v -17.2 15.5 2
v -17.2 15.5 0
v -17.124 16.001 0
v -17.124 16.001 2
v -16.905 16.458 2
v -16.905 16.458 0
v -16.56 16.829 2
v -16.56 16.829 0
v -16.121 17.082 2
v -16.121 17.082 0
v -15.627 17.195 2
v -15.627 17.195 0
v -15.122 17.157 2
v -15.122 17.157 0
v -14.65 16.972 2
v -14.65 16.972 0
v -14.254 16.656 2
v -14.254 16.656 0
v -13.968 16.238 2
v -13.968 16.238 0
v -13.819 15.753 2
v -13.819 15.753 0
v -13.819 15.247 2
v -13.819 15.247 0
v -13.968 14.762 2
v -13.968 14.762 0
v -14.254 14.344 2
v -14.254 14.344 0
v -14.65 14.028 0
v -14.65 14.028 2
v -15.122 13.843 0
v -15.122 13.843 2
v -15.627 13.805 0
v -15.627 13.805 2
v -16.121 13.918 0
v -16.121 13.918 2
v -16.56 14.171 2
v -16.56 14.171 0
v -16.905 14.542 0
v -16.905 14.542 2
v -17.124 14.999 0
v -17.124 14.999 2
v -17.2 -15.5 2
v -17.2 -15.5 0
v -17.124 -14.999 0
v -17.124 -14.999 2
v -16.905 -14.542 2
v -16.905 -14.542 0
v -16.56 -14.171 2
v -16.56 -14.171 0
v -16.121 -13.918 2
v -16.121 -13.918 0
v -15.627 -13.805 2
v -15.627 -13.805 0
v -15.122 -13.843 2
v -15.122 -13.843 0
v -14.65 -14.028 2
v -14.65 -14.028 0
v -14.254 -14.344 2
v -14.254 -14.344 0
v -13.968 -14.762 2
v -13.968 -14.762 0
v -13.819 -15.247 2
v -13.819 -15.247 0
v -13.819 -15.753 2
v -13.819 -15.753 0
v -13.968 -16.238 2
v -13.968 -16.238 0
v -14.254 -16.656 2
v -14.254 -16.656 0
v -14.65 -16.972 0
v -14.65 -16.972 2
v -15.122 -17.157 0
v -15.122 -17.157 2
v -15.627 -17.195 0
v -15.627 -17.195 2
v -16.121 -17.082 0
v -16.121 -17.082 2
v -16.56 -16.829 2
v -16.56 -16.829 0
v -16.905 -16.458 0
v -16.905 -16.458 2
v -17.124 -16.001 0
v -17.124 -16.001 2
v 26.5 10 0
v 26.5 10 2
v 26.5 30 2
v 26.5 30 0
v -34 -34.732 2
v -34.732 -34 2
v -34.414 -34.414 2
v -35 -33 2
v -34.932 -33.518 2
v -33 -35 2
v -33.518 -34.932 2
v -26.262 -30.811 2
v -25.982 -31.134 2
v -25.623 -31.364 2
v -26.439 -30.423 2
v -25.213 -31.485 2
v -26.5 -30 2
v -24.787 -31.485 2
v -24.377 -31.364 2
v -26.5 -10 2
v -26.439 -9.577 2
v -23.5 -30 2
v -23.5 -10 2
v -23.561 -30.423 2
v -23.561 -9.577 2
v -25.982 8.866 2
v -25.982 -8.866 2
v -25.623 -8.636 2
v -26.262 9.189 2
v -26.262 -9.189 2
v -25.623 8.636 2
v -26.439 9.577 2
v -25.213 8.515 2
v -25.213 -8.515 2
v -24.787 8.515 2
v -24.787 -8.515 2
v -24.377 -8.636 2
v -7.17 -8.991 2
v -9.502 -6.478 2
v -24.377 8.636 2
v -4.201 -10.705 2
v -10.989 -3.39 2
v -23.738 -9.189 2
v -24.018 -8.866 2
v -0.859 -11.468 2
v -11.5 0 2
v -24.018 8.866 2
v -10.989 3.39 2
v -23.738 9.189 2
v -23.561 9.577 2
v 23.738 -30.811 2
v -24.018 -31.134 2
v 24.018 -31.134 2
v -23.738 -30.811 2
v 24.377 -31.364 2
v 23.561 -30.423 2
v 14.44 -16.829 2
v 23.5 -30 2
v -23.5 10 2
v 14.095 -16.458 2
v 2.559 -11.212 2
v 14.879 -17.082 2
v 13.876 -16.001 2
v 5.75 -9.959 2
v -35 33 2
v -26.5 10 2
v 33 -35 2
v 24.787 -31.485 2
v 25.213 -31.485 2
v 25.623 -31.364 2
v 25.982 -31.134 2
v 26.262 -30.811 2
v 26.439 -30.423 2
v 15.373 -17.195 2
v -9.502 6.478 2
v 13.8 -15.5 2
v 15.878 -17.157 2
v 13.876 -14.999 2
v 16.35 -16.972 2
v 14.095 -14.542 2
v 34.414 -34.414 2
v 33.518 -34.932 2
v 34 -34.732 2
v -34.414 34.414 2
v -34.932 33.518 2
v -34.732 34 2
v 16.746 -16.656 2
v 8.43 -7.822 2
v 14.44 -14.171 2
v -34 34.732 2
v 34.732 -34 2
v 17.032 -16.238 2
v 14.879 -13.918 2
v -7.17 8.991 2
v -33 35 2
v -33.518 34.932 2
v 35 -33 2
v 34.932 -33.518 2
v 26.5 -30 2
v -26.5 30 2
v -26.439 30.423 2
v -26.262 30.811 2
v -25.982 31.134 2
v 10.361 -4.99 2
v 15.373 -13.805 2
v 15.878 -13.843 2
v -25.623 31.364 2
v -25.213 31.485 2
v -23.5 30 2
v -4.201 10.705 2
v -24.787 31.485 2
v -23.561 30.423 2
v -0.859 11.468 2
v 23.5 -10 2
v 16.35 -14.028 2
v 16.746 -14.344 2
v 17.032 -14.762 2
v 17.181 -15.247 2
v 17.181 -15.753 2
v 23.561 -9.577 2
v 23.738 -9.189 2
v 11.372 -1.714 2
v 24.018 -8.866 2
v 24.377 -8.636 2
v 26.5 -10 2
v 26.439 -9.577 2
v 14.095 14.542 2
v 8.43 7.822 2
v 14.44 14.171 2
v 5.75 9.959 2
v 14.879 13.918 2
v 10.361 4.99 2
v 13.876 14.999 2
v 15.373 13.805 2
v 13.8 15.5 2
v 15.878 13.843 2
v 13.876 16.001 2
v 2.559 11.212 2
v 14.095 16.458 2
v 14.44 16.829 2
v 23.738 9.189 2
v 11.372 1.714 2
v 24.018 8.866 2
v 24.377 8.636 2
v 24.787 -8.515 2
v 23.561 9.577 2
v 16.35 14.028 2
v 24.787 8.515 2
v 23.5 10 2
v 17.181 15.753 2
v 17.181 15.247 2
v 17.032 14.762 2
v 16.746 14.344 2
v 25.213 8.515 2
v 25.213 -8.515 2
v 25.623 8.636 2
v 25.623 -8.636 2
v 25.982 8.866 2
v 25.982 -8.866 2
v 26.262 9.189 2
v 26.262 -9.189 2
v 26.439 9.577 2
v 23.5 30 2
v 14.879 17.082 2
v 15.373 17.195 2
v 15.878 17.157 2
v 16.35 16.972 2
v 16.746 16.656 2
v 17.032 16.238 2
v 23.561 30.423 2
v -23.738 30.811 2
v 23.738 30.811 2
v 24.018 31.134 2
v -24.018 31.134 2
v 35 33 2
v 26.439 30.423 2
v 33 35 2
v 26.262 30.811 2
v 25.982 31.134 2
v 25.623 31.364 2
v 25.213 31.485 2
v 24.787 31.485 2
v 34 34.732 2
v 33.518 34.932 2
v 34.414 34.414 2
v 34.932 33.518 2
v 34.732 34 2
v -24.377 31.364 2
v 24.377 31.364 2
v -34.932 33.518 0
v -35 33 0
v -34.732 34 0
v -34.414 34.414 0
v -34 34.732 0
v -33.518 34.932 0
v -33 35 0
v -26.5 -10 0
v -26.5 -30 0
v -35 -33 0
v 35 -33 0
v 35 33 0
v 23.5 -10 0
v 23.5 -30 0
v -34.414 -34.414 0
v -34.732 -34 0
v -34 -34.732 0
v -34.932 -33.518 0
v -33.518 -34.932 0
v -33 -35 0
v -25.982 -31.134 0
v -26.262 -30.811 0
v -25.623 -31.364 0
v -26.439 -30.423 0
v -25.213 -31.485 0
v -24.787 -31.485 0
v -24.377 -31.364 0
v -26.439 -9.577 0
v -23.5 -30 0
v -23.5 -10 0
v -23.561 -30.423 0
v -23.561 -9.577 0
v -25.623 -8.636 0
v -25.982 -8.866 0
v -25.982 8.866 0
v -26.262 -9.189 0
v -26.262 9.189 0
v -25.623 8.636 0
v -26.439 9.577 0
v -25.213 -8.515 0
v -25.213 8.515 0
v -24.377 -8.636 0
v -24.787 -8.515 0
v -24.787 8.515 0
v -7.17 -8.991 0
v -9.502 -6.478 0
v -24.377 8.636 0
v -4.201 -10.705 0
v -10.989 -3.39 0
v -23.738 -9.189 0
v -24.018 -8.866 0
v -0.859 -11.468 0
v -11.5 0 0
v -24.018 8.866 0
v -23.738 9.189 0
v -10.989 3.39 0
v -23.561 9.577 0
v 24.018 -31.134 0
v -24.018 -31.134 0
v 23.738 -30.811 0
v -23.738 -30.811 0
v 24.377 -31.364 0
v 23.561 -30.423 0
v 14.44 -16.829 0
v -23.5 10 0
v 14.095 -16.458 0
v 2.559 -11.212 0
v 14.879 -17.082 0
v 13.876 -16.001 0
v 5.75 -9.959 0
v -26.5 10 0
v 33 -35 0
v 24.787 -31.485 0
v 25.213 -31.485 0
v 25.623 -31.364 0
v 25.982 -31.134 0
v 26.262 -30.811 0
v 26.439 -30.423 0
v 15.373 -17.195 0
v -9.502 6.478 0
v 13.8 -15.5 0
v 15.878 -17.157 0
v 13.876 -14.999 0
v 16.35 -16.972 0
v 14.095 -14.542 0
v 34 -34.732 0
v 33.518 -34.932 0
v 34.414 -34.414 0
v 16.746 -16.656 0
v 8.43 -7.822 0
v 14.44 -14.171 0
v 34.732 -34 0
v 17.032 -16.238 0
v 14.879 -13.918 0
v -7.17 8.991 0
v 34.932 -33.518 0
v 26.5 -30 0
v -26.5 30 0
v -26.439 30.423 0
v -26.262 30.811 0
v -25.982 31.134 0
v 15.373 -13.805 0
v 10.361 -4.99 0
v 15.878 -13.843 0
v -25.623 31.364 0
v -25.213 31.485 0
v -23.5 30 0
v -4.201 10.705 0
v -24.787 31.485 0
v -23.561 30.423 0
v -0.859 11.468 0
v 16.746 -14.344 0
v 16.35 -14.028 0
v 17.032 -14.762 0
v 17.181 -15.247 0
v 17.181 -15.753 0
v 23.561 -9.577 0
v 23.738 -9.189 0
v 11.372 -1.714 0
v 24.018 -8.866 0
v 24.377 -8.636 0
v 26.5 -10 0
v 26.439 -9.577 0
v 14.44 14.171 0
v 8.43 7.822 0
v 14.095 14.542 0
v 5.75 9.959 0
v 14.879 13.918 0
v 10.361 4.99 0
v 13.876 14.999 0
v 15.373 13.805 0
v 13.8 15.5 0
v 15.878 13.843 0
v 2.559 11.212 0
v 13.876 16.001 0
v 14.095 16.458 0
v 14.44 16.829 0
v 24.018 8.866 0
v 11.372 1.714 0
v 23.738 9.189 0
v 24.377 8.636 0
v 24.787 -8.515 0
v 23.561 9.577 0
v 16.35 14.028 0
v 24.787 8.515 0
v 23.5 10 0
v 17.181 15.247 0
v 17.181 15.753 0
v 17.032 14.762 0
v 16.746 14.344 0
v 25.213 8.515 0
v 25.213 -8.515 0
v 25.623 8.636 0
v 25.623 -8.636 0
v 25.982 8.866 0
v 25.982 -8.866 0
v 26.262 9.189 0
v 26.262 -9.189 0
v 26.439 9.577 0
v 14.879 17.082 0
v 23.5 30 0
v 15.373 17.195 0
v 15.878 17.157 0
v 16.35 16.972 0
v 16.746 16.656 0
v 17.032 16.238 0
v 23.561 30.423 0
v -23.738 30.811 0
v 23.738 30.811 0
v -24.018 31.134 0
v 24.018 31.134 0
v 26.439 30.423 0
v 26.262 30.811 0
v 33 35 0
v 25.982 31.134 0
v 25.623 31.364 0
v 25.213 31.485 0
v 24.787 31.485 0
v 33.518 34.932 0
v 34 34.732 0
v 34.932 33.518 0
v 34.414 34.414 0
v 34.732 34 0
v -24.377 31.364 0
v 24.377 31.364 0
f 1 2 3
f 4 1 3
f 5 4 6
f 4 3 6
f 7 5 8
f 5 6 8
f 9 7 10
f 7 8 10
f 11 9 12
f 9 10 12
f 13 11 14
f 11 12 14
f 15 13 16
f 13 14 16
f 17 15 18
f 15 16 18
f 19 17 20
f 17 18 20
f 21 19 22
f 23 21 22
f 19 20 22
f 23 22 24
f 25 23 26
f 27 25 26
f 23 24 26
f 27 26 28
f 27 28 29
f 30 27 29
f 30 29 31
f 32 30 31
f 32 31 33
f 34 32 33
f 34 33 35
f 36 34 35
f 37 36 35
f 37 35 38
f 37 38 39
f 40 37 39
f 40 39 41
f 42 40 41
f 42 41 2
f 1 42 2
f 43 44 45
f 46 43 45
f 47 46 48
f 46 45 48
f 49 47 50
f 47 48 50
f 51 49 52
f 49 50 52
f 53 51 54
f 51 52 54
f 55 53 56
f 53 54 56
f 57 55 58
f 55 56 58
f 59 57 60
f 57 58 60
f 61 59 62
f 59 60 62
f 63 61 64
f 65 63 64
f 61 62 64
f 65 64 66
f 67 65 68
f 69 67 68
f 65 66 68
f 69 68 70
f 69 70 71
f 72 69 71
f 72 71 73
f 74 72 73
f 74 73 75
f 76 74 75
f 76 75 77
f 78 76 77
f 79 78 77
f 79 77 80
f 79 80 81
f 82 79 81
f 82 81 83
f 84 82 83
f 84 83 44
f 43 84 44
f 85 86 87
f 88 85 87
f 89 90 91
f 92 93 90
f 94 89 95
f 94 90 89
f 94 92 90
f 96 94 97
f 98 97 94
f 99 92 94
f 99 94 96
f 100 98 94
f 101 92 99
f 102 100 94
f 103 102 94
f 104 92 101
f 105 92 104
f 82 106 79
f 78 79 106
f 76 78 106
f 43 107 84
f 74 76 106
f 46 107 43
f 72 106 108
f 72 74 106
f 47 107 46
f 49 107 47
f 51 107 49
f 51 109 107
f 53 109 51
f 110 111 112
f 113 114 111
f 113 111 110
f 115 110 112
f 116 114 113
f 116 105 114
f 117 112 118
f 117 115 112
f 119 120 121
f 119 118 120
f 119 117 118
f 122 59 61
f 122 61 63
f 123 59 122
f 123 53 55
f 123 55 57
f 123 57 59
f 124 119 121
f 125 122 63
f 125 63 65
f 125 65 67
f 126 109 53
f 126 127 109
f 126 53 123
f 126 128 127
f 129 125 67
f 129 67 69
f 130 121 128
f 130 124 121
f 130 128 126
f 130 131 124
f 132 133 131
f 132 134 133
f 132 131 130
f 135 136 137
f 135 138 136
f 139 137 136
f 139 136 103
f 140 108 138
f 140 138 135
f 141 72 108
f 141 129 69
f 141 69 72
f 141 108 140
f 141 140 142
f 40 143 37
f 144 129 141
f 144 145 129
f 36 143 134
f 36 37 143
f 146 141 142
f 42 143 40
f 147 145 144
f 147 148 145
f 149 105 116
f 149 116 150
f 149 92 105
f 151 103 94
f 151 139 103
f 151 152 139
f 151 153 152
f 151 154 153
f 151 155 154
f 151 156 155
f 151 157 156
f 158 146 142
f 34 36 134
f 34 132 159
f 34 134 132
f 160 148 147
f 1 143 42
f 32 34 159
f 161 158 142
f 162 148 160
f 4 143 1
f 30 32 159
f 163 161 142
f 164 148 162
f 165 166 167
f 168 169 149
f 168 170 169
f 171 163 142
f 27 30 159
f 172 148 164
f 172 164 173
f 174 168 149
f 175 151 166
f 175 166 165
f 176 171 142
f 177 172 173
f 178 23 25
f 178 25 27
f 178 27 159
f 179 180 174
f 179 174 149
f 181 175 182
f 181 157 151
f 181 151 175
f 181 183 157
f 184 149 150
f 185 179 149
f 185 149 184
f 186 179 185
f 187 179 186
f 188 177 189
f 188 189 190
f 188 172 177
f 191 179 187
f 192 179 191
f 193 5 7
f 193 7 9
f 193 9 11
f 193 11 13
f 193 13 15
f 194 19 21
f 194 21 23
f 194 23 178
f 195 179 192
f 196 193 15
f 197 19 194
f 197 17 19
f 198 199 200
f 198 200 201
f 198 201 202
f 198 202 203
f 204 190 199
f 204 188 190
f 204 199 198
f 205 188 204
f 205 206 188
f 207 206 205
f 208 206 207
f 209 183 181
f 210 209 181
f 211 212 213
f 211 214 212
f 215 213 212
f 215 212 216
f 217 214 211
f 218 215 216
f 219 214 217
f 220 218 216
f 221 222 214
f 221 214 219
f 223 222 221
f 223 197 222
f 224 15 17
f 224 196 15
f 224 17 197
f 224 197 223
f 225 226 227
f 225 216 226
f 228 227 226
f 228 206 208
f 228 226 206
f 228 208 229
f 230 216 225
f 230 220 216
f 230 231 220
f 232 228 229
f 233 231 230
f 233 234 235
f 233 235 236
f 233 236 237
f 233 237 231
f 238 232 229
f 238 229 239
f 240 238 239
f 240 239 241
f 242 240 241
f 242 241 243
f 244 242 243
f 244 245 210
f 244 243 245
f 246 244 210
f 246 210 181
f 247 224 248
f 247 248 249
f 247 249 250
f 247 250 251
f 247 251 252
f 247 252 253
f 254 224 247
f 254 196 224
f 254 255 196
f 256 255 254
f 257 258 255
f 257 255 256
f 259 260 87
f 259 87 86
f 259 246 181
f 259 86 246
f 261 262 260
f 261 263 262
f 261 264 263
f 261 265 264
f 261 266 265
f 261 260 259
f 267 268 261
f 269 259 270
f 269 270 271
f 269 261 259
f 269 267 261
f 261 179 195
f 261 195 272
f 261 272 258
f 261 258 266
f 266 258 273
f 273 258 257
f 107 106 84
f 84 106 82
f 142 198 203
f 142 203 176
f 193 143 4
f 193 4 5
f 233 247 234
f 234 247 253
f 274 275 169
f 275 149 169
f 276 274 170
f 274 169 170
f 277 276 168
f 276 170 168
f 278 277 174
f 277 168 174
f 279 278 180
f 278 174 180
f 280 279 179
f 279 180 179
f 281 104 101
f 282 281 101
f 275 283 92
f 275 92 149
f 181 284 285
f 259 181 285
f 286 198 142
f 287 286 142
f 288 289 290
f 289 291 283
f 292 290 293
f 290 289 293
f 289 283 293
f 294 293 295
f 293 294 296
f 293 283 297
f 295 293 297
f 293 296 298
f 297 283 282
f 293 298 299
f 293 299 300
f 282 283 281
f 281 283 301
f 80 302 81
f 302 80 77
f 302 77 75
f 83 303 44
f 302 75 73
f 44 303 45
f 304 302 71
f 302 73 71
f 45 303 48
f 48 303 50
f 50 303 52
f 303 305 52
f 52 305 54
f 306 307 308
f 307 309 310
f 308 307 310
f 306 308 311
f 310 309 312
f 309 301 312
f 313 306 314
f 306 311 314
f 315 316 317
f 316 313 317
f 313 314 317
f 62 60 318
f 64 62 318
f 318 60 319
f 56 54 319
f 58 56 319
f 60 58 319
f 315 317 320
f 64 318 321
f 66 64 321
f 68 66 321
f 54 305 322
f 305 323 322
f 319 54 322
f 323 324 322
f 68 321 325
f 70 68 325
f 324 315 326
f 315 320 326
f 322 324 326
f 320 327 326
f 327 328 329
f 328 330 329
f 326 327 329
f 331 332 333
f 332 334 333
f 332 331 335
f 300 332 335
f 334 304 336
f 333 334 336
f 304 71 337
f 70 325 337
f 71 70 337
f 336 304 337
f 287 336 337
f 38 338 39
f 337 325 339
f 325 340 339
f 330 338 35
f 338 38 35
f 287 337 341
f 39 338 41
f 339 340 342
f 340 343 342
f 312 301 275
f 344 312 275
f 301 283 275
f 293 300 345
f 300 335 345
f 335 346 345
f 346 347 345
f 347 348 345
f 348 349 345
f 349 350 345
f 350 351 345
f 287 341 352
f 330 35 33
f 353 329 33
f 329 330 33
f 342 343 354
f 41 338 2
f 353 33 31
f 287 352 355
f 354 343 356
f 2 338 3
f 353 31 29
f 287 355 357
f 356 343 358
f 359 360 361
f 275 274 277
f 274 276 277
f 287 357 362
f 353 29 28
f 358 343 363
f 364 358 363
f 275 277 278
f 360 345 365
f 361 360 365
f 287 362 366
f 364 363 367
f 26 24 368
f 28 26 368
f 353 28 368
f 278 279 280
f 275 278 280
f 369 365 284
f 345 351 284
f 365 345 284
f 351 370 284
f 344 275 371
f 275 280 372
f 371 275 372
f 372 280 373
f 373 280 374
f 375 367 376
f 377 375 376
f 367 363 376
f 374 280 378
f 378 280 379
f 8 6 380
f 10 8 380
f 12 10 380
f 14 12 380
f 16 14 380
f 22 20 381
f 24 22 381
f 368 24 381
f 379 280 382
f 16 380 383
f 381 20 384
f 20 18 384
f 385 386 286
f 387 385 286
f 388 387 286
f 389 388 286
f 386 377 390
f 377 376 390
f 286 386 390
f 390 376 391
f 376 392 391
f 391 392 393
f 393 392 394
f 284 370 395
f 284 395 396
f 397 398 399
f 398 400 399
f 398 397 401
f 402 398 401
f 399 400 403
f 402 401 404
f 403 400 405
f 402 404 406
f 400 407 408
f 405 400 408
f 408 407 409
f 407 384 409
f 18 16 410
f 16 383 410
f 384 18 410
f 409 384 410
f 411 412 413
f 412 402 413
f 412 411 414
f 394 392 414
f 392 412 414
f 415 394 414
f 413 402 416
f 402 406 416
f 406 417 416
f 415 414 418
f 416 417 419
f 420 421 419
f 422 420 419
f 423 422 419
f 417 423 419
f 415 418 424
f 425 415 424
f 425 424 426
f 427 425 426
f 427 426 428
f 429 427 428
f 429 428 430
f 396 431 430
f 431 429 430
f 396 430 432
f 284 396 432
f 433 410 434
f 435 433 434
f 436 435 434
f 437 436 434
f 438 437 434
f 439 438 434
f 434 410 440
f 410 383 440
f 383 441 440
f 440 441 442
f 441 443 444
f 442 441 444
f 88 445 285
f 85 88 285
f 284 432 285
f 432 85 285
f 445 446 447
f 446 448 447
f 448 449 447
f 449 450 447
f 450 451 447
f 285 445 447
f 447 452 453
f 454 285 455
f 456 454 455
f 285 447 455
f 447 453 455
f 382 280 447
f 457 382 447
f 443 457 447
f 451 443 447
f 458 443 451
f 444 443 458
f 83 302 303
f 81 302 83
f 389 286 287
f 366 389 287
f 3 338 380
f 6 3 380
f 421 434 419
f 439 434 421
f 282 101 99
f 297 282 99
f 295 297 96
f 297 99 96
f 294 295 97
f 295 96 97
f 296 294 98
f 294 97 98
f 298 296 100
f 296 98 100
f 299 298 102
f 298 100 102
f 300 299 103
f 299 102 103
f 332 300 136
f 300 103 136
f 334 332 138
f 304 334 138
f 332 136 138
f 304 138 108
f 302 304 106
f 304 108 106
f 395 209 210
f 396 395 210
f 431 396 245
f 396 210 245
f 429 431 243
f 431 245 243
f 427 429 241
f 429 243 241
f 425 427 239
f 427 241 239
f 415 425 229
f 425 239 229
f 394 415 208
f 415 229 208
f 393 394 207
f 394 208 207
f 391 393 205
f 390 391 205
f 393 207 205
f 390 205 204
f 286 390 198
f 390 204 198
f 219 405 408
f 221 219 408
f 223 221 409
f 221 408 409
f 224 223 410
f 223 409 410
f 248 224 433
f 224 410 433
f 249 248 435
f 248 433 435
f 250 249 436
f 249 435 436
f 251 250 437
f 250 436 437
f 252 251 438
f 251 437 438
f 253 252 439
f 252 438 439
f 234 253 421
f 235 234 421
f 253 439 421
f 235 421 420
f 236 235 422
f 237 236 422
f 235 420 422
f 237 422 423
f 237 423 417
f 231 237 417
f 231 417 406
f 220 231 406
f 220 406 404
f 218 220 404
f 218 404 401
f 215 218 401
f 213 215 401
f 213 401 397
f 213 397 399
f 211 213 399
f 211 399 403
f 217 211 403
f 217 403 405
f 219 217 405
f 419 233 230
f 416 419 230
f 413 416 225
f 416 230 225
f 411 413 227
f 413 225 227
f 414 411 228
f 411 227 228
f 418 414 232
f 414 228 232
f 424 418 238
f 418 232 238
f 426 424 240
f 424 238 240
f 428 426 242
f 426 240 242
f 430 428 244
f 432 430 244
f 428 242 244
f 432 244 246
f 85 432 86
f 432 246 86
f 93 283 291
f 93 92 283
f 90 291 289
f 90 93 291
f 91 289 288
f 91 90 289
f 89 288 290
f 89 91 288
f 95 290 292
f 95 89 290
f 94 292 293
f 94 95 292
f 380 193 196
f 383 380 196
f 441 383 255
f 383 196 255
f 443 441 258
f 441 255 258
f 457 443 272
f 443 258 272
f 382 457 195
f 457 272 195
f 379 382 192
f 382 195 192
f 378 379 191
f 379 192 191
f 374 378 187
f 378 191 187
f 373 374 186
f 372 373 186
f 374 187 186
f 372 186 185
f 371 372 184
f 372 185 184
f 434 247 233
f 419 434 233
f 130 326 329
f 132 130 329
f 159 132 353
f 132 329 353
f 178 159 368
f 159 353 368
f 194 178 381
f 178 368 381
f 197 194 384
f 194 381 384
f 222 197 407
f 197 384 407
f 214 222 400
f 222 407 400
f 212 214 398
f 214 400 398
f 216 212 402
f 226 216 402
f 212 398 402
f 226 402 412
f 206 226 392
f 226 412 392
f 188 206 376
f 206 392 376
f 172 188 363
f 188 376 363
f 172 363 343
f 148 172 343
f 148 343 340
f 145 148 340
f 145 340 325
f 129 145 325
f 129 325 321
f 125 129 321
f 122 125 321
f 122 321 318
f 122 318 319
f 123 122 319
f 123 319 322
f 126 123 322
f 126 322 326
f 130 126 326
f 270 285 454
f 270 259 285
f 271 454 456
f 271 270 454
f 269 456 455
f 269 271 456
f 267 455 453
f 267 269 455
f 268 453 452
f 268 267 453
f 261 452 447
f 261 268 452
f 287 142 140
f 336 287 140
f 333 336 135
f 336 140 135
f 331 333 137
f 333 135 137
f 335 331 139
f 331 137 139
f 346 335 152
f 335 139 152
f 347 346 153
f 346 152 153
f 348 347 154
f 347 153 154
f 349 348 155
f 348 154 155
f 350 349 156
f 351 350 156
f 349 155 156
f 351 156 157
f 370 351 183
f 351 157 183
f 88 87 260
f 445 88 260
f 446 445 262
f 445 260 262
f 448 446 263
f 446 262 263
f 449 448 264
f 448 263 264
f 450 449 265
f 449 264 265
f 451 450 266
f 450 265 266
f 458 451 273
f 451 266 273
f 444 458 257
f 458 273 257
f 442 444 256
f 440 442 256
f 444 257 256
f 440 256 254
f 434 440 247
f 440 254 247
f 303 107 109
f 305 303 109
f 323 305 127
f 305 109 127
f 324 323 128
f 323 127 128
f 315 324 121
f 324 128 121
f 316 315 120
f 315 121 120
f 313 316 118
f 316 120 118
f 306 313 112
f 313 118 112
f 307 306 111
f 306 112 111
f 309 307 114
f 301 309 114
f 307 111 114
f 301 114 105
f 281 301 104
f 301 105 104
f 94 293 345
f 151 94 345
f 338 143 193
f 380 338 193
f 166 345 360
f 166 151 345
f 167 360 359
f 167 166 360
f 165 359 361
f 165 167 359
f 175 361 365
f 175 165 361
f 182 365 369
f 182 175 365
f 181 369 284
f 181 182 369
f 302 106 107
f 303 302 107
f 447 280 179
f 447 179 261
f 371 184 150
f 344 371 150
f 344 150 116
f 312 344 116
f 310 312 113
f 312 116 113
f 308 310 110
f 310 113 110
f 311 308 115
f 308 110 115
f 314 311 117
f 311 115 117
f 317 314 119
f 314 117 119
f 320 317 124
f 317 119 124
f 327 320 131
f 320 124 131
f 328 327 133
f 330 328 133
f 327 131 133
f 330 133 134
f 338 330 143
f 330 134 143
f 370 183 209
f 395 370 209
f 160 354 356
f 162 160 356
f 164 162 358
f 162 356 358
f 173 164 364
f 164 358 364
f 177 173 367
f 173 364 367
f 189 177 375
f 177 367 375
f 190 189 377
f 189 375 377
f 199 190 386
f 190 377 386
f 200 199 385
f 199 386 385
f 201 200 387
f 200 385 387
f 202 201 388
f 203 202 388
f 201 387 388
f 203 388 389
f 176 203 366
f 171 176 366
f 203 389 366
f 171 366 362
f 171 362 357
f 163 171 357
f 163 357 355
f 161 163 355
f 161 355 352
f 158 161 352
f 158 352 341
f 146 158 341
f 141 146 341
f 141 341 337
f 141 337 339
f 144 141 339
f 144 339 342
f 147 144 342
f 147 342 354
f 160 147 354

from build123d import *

# Parameters (mm, degrees)
SKIZZE1_W                        = 70
SKIZZE1_H                        = 70
AUFSATZ_LINEAR_AUSTRAGEN1_DEPTH  = 2
VERRUNDUNG2_R                    = 2
F_23_0_23_DURCHMESSER_BOHRUNG1_D = 23
DURCHGANGSLOCH_F_R_M31_D         = 3.4
SCHNITT_LINEAR_AUSTRAGEN1_DEPTH  = 50.537864306


with BuildPart() as part:
    # Skizze1 → Aufsatz-Linear austragen1 (new body)
    with BuildSketch(Plane.XY):
        Rectangle(SKIZZE1_W, SKIZZE1_H)
    extrude(amount=AUFSATZ_LINEAR_AUSTRAGEN1_DEPTH)

    # Verrundung2
    verrundung2_edges = [part.edges().sort_by_distance(p)[0] for p in [
        (-35, 35, 1),
        (35, 35, 1),
        (35, -35, 1),
        (-35, -35, 1),
    ]]
    fillet(verrundung2_edges, radius=VERRUNDUNG2_R)

    # Ø23.0 (23) Durchmesser Bohrung1 (through all)
    with Locations(Plane.XY.offset(2)):
        with Locations((0, 0)):
            Hole(F_23_0_23_DURCHMESSER_BOHRUNG1_D / 2)

    # Durchgangsloch für M31 (through all)
    with Locations(Plane.XY.offset(2)):
        with Locations((-15.5, 15.5), (15.5, 15.5), (15.5, -15.5), (-15.5, -15.5)):
            Hole(DURCHGANGSLOCH_F_R_M31_D / 2)

    # Skizze8 → Schnitt-Linear austragen1 (cut, through all)
    with BuildSketch(Plane.XY.offset(2)):
        with BuildLine():
            Line((-26.5, 30), (-26.5, 10))
            ThreePointArc((-26.5, 10), (-25, 8.5), (-23.5, 10))
            Line((-23.5, 10), (-23.5, 30))
            ThreePointArc((-23.5, 30), (-25, 31.5), (-26.5, 30))
        make_face()
        with BuildLine():
            Line((-26.5, -10), (-26.5, -30))
            ThreePointArc((-26.5, -30), (-25, -31.5), (-23.5, -30))
            Line((-23.5, -30), (-23.5, -10))
            ThreePointArc((-23.5, -10), (-25, -8.5), (-26.5, -10))
        make_face()
        with BuildLine():
            Line((23.5, -10), (23.5, -30))
            ThreePointArc((23.5, -30), (25, -31.5), (26.5, -30))
            Line((26.5, -30), (26.5, -10))
            ThreePointArc((26.5, -10), (25, -8.5), (23.5, -10))
        make_face()
        with BuildLine():
            Line((23.5, 30), (23.5, 10))
            ThreePointArc((23.5, 10), (25, 8.5), (26.5, 10))
            Line((26.5, 10), (26.5, 30))
            ThreePointArc((26.5, 30), (25, 31.5), (23.5, 30))
        make_face()
    extrude(amount=-SCHNITT_LINEAR_AUSTRAGEN1_DEPTH, mode=Mode.SUBTRACT)


solid = part.part
